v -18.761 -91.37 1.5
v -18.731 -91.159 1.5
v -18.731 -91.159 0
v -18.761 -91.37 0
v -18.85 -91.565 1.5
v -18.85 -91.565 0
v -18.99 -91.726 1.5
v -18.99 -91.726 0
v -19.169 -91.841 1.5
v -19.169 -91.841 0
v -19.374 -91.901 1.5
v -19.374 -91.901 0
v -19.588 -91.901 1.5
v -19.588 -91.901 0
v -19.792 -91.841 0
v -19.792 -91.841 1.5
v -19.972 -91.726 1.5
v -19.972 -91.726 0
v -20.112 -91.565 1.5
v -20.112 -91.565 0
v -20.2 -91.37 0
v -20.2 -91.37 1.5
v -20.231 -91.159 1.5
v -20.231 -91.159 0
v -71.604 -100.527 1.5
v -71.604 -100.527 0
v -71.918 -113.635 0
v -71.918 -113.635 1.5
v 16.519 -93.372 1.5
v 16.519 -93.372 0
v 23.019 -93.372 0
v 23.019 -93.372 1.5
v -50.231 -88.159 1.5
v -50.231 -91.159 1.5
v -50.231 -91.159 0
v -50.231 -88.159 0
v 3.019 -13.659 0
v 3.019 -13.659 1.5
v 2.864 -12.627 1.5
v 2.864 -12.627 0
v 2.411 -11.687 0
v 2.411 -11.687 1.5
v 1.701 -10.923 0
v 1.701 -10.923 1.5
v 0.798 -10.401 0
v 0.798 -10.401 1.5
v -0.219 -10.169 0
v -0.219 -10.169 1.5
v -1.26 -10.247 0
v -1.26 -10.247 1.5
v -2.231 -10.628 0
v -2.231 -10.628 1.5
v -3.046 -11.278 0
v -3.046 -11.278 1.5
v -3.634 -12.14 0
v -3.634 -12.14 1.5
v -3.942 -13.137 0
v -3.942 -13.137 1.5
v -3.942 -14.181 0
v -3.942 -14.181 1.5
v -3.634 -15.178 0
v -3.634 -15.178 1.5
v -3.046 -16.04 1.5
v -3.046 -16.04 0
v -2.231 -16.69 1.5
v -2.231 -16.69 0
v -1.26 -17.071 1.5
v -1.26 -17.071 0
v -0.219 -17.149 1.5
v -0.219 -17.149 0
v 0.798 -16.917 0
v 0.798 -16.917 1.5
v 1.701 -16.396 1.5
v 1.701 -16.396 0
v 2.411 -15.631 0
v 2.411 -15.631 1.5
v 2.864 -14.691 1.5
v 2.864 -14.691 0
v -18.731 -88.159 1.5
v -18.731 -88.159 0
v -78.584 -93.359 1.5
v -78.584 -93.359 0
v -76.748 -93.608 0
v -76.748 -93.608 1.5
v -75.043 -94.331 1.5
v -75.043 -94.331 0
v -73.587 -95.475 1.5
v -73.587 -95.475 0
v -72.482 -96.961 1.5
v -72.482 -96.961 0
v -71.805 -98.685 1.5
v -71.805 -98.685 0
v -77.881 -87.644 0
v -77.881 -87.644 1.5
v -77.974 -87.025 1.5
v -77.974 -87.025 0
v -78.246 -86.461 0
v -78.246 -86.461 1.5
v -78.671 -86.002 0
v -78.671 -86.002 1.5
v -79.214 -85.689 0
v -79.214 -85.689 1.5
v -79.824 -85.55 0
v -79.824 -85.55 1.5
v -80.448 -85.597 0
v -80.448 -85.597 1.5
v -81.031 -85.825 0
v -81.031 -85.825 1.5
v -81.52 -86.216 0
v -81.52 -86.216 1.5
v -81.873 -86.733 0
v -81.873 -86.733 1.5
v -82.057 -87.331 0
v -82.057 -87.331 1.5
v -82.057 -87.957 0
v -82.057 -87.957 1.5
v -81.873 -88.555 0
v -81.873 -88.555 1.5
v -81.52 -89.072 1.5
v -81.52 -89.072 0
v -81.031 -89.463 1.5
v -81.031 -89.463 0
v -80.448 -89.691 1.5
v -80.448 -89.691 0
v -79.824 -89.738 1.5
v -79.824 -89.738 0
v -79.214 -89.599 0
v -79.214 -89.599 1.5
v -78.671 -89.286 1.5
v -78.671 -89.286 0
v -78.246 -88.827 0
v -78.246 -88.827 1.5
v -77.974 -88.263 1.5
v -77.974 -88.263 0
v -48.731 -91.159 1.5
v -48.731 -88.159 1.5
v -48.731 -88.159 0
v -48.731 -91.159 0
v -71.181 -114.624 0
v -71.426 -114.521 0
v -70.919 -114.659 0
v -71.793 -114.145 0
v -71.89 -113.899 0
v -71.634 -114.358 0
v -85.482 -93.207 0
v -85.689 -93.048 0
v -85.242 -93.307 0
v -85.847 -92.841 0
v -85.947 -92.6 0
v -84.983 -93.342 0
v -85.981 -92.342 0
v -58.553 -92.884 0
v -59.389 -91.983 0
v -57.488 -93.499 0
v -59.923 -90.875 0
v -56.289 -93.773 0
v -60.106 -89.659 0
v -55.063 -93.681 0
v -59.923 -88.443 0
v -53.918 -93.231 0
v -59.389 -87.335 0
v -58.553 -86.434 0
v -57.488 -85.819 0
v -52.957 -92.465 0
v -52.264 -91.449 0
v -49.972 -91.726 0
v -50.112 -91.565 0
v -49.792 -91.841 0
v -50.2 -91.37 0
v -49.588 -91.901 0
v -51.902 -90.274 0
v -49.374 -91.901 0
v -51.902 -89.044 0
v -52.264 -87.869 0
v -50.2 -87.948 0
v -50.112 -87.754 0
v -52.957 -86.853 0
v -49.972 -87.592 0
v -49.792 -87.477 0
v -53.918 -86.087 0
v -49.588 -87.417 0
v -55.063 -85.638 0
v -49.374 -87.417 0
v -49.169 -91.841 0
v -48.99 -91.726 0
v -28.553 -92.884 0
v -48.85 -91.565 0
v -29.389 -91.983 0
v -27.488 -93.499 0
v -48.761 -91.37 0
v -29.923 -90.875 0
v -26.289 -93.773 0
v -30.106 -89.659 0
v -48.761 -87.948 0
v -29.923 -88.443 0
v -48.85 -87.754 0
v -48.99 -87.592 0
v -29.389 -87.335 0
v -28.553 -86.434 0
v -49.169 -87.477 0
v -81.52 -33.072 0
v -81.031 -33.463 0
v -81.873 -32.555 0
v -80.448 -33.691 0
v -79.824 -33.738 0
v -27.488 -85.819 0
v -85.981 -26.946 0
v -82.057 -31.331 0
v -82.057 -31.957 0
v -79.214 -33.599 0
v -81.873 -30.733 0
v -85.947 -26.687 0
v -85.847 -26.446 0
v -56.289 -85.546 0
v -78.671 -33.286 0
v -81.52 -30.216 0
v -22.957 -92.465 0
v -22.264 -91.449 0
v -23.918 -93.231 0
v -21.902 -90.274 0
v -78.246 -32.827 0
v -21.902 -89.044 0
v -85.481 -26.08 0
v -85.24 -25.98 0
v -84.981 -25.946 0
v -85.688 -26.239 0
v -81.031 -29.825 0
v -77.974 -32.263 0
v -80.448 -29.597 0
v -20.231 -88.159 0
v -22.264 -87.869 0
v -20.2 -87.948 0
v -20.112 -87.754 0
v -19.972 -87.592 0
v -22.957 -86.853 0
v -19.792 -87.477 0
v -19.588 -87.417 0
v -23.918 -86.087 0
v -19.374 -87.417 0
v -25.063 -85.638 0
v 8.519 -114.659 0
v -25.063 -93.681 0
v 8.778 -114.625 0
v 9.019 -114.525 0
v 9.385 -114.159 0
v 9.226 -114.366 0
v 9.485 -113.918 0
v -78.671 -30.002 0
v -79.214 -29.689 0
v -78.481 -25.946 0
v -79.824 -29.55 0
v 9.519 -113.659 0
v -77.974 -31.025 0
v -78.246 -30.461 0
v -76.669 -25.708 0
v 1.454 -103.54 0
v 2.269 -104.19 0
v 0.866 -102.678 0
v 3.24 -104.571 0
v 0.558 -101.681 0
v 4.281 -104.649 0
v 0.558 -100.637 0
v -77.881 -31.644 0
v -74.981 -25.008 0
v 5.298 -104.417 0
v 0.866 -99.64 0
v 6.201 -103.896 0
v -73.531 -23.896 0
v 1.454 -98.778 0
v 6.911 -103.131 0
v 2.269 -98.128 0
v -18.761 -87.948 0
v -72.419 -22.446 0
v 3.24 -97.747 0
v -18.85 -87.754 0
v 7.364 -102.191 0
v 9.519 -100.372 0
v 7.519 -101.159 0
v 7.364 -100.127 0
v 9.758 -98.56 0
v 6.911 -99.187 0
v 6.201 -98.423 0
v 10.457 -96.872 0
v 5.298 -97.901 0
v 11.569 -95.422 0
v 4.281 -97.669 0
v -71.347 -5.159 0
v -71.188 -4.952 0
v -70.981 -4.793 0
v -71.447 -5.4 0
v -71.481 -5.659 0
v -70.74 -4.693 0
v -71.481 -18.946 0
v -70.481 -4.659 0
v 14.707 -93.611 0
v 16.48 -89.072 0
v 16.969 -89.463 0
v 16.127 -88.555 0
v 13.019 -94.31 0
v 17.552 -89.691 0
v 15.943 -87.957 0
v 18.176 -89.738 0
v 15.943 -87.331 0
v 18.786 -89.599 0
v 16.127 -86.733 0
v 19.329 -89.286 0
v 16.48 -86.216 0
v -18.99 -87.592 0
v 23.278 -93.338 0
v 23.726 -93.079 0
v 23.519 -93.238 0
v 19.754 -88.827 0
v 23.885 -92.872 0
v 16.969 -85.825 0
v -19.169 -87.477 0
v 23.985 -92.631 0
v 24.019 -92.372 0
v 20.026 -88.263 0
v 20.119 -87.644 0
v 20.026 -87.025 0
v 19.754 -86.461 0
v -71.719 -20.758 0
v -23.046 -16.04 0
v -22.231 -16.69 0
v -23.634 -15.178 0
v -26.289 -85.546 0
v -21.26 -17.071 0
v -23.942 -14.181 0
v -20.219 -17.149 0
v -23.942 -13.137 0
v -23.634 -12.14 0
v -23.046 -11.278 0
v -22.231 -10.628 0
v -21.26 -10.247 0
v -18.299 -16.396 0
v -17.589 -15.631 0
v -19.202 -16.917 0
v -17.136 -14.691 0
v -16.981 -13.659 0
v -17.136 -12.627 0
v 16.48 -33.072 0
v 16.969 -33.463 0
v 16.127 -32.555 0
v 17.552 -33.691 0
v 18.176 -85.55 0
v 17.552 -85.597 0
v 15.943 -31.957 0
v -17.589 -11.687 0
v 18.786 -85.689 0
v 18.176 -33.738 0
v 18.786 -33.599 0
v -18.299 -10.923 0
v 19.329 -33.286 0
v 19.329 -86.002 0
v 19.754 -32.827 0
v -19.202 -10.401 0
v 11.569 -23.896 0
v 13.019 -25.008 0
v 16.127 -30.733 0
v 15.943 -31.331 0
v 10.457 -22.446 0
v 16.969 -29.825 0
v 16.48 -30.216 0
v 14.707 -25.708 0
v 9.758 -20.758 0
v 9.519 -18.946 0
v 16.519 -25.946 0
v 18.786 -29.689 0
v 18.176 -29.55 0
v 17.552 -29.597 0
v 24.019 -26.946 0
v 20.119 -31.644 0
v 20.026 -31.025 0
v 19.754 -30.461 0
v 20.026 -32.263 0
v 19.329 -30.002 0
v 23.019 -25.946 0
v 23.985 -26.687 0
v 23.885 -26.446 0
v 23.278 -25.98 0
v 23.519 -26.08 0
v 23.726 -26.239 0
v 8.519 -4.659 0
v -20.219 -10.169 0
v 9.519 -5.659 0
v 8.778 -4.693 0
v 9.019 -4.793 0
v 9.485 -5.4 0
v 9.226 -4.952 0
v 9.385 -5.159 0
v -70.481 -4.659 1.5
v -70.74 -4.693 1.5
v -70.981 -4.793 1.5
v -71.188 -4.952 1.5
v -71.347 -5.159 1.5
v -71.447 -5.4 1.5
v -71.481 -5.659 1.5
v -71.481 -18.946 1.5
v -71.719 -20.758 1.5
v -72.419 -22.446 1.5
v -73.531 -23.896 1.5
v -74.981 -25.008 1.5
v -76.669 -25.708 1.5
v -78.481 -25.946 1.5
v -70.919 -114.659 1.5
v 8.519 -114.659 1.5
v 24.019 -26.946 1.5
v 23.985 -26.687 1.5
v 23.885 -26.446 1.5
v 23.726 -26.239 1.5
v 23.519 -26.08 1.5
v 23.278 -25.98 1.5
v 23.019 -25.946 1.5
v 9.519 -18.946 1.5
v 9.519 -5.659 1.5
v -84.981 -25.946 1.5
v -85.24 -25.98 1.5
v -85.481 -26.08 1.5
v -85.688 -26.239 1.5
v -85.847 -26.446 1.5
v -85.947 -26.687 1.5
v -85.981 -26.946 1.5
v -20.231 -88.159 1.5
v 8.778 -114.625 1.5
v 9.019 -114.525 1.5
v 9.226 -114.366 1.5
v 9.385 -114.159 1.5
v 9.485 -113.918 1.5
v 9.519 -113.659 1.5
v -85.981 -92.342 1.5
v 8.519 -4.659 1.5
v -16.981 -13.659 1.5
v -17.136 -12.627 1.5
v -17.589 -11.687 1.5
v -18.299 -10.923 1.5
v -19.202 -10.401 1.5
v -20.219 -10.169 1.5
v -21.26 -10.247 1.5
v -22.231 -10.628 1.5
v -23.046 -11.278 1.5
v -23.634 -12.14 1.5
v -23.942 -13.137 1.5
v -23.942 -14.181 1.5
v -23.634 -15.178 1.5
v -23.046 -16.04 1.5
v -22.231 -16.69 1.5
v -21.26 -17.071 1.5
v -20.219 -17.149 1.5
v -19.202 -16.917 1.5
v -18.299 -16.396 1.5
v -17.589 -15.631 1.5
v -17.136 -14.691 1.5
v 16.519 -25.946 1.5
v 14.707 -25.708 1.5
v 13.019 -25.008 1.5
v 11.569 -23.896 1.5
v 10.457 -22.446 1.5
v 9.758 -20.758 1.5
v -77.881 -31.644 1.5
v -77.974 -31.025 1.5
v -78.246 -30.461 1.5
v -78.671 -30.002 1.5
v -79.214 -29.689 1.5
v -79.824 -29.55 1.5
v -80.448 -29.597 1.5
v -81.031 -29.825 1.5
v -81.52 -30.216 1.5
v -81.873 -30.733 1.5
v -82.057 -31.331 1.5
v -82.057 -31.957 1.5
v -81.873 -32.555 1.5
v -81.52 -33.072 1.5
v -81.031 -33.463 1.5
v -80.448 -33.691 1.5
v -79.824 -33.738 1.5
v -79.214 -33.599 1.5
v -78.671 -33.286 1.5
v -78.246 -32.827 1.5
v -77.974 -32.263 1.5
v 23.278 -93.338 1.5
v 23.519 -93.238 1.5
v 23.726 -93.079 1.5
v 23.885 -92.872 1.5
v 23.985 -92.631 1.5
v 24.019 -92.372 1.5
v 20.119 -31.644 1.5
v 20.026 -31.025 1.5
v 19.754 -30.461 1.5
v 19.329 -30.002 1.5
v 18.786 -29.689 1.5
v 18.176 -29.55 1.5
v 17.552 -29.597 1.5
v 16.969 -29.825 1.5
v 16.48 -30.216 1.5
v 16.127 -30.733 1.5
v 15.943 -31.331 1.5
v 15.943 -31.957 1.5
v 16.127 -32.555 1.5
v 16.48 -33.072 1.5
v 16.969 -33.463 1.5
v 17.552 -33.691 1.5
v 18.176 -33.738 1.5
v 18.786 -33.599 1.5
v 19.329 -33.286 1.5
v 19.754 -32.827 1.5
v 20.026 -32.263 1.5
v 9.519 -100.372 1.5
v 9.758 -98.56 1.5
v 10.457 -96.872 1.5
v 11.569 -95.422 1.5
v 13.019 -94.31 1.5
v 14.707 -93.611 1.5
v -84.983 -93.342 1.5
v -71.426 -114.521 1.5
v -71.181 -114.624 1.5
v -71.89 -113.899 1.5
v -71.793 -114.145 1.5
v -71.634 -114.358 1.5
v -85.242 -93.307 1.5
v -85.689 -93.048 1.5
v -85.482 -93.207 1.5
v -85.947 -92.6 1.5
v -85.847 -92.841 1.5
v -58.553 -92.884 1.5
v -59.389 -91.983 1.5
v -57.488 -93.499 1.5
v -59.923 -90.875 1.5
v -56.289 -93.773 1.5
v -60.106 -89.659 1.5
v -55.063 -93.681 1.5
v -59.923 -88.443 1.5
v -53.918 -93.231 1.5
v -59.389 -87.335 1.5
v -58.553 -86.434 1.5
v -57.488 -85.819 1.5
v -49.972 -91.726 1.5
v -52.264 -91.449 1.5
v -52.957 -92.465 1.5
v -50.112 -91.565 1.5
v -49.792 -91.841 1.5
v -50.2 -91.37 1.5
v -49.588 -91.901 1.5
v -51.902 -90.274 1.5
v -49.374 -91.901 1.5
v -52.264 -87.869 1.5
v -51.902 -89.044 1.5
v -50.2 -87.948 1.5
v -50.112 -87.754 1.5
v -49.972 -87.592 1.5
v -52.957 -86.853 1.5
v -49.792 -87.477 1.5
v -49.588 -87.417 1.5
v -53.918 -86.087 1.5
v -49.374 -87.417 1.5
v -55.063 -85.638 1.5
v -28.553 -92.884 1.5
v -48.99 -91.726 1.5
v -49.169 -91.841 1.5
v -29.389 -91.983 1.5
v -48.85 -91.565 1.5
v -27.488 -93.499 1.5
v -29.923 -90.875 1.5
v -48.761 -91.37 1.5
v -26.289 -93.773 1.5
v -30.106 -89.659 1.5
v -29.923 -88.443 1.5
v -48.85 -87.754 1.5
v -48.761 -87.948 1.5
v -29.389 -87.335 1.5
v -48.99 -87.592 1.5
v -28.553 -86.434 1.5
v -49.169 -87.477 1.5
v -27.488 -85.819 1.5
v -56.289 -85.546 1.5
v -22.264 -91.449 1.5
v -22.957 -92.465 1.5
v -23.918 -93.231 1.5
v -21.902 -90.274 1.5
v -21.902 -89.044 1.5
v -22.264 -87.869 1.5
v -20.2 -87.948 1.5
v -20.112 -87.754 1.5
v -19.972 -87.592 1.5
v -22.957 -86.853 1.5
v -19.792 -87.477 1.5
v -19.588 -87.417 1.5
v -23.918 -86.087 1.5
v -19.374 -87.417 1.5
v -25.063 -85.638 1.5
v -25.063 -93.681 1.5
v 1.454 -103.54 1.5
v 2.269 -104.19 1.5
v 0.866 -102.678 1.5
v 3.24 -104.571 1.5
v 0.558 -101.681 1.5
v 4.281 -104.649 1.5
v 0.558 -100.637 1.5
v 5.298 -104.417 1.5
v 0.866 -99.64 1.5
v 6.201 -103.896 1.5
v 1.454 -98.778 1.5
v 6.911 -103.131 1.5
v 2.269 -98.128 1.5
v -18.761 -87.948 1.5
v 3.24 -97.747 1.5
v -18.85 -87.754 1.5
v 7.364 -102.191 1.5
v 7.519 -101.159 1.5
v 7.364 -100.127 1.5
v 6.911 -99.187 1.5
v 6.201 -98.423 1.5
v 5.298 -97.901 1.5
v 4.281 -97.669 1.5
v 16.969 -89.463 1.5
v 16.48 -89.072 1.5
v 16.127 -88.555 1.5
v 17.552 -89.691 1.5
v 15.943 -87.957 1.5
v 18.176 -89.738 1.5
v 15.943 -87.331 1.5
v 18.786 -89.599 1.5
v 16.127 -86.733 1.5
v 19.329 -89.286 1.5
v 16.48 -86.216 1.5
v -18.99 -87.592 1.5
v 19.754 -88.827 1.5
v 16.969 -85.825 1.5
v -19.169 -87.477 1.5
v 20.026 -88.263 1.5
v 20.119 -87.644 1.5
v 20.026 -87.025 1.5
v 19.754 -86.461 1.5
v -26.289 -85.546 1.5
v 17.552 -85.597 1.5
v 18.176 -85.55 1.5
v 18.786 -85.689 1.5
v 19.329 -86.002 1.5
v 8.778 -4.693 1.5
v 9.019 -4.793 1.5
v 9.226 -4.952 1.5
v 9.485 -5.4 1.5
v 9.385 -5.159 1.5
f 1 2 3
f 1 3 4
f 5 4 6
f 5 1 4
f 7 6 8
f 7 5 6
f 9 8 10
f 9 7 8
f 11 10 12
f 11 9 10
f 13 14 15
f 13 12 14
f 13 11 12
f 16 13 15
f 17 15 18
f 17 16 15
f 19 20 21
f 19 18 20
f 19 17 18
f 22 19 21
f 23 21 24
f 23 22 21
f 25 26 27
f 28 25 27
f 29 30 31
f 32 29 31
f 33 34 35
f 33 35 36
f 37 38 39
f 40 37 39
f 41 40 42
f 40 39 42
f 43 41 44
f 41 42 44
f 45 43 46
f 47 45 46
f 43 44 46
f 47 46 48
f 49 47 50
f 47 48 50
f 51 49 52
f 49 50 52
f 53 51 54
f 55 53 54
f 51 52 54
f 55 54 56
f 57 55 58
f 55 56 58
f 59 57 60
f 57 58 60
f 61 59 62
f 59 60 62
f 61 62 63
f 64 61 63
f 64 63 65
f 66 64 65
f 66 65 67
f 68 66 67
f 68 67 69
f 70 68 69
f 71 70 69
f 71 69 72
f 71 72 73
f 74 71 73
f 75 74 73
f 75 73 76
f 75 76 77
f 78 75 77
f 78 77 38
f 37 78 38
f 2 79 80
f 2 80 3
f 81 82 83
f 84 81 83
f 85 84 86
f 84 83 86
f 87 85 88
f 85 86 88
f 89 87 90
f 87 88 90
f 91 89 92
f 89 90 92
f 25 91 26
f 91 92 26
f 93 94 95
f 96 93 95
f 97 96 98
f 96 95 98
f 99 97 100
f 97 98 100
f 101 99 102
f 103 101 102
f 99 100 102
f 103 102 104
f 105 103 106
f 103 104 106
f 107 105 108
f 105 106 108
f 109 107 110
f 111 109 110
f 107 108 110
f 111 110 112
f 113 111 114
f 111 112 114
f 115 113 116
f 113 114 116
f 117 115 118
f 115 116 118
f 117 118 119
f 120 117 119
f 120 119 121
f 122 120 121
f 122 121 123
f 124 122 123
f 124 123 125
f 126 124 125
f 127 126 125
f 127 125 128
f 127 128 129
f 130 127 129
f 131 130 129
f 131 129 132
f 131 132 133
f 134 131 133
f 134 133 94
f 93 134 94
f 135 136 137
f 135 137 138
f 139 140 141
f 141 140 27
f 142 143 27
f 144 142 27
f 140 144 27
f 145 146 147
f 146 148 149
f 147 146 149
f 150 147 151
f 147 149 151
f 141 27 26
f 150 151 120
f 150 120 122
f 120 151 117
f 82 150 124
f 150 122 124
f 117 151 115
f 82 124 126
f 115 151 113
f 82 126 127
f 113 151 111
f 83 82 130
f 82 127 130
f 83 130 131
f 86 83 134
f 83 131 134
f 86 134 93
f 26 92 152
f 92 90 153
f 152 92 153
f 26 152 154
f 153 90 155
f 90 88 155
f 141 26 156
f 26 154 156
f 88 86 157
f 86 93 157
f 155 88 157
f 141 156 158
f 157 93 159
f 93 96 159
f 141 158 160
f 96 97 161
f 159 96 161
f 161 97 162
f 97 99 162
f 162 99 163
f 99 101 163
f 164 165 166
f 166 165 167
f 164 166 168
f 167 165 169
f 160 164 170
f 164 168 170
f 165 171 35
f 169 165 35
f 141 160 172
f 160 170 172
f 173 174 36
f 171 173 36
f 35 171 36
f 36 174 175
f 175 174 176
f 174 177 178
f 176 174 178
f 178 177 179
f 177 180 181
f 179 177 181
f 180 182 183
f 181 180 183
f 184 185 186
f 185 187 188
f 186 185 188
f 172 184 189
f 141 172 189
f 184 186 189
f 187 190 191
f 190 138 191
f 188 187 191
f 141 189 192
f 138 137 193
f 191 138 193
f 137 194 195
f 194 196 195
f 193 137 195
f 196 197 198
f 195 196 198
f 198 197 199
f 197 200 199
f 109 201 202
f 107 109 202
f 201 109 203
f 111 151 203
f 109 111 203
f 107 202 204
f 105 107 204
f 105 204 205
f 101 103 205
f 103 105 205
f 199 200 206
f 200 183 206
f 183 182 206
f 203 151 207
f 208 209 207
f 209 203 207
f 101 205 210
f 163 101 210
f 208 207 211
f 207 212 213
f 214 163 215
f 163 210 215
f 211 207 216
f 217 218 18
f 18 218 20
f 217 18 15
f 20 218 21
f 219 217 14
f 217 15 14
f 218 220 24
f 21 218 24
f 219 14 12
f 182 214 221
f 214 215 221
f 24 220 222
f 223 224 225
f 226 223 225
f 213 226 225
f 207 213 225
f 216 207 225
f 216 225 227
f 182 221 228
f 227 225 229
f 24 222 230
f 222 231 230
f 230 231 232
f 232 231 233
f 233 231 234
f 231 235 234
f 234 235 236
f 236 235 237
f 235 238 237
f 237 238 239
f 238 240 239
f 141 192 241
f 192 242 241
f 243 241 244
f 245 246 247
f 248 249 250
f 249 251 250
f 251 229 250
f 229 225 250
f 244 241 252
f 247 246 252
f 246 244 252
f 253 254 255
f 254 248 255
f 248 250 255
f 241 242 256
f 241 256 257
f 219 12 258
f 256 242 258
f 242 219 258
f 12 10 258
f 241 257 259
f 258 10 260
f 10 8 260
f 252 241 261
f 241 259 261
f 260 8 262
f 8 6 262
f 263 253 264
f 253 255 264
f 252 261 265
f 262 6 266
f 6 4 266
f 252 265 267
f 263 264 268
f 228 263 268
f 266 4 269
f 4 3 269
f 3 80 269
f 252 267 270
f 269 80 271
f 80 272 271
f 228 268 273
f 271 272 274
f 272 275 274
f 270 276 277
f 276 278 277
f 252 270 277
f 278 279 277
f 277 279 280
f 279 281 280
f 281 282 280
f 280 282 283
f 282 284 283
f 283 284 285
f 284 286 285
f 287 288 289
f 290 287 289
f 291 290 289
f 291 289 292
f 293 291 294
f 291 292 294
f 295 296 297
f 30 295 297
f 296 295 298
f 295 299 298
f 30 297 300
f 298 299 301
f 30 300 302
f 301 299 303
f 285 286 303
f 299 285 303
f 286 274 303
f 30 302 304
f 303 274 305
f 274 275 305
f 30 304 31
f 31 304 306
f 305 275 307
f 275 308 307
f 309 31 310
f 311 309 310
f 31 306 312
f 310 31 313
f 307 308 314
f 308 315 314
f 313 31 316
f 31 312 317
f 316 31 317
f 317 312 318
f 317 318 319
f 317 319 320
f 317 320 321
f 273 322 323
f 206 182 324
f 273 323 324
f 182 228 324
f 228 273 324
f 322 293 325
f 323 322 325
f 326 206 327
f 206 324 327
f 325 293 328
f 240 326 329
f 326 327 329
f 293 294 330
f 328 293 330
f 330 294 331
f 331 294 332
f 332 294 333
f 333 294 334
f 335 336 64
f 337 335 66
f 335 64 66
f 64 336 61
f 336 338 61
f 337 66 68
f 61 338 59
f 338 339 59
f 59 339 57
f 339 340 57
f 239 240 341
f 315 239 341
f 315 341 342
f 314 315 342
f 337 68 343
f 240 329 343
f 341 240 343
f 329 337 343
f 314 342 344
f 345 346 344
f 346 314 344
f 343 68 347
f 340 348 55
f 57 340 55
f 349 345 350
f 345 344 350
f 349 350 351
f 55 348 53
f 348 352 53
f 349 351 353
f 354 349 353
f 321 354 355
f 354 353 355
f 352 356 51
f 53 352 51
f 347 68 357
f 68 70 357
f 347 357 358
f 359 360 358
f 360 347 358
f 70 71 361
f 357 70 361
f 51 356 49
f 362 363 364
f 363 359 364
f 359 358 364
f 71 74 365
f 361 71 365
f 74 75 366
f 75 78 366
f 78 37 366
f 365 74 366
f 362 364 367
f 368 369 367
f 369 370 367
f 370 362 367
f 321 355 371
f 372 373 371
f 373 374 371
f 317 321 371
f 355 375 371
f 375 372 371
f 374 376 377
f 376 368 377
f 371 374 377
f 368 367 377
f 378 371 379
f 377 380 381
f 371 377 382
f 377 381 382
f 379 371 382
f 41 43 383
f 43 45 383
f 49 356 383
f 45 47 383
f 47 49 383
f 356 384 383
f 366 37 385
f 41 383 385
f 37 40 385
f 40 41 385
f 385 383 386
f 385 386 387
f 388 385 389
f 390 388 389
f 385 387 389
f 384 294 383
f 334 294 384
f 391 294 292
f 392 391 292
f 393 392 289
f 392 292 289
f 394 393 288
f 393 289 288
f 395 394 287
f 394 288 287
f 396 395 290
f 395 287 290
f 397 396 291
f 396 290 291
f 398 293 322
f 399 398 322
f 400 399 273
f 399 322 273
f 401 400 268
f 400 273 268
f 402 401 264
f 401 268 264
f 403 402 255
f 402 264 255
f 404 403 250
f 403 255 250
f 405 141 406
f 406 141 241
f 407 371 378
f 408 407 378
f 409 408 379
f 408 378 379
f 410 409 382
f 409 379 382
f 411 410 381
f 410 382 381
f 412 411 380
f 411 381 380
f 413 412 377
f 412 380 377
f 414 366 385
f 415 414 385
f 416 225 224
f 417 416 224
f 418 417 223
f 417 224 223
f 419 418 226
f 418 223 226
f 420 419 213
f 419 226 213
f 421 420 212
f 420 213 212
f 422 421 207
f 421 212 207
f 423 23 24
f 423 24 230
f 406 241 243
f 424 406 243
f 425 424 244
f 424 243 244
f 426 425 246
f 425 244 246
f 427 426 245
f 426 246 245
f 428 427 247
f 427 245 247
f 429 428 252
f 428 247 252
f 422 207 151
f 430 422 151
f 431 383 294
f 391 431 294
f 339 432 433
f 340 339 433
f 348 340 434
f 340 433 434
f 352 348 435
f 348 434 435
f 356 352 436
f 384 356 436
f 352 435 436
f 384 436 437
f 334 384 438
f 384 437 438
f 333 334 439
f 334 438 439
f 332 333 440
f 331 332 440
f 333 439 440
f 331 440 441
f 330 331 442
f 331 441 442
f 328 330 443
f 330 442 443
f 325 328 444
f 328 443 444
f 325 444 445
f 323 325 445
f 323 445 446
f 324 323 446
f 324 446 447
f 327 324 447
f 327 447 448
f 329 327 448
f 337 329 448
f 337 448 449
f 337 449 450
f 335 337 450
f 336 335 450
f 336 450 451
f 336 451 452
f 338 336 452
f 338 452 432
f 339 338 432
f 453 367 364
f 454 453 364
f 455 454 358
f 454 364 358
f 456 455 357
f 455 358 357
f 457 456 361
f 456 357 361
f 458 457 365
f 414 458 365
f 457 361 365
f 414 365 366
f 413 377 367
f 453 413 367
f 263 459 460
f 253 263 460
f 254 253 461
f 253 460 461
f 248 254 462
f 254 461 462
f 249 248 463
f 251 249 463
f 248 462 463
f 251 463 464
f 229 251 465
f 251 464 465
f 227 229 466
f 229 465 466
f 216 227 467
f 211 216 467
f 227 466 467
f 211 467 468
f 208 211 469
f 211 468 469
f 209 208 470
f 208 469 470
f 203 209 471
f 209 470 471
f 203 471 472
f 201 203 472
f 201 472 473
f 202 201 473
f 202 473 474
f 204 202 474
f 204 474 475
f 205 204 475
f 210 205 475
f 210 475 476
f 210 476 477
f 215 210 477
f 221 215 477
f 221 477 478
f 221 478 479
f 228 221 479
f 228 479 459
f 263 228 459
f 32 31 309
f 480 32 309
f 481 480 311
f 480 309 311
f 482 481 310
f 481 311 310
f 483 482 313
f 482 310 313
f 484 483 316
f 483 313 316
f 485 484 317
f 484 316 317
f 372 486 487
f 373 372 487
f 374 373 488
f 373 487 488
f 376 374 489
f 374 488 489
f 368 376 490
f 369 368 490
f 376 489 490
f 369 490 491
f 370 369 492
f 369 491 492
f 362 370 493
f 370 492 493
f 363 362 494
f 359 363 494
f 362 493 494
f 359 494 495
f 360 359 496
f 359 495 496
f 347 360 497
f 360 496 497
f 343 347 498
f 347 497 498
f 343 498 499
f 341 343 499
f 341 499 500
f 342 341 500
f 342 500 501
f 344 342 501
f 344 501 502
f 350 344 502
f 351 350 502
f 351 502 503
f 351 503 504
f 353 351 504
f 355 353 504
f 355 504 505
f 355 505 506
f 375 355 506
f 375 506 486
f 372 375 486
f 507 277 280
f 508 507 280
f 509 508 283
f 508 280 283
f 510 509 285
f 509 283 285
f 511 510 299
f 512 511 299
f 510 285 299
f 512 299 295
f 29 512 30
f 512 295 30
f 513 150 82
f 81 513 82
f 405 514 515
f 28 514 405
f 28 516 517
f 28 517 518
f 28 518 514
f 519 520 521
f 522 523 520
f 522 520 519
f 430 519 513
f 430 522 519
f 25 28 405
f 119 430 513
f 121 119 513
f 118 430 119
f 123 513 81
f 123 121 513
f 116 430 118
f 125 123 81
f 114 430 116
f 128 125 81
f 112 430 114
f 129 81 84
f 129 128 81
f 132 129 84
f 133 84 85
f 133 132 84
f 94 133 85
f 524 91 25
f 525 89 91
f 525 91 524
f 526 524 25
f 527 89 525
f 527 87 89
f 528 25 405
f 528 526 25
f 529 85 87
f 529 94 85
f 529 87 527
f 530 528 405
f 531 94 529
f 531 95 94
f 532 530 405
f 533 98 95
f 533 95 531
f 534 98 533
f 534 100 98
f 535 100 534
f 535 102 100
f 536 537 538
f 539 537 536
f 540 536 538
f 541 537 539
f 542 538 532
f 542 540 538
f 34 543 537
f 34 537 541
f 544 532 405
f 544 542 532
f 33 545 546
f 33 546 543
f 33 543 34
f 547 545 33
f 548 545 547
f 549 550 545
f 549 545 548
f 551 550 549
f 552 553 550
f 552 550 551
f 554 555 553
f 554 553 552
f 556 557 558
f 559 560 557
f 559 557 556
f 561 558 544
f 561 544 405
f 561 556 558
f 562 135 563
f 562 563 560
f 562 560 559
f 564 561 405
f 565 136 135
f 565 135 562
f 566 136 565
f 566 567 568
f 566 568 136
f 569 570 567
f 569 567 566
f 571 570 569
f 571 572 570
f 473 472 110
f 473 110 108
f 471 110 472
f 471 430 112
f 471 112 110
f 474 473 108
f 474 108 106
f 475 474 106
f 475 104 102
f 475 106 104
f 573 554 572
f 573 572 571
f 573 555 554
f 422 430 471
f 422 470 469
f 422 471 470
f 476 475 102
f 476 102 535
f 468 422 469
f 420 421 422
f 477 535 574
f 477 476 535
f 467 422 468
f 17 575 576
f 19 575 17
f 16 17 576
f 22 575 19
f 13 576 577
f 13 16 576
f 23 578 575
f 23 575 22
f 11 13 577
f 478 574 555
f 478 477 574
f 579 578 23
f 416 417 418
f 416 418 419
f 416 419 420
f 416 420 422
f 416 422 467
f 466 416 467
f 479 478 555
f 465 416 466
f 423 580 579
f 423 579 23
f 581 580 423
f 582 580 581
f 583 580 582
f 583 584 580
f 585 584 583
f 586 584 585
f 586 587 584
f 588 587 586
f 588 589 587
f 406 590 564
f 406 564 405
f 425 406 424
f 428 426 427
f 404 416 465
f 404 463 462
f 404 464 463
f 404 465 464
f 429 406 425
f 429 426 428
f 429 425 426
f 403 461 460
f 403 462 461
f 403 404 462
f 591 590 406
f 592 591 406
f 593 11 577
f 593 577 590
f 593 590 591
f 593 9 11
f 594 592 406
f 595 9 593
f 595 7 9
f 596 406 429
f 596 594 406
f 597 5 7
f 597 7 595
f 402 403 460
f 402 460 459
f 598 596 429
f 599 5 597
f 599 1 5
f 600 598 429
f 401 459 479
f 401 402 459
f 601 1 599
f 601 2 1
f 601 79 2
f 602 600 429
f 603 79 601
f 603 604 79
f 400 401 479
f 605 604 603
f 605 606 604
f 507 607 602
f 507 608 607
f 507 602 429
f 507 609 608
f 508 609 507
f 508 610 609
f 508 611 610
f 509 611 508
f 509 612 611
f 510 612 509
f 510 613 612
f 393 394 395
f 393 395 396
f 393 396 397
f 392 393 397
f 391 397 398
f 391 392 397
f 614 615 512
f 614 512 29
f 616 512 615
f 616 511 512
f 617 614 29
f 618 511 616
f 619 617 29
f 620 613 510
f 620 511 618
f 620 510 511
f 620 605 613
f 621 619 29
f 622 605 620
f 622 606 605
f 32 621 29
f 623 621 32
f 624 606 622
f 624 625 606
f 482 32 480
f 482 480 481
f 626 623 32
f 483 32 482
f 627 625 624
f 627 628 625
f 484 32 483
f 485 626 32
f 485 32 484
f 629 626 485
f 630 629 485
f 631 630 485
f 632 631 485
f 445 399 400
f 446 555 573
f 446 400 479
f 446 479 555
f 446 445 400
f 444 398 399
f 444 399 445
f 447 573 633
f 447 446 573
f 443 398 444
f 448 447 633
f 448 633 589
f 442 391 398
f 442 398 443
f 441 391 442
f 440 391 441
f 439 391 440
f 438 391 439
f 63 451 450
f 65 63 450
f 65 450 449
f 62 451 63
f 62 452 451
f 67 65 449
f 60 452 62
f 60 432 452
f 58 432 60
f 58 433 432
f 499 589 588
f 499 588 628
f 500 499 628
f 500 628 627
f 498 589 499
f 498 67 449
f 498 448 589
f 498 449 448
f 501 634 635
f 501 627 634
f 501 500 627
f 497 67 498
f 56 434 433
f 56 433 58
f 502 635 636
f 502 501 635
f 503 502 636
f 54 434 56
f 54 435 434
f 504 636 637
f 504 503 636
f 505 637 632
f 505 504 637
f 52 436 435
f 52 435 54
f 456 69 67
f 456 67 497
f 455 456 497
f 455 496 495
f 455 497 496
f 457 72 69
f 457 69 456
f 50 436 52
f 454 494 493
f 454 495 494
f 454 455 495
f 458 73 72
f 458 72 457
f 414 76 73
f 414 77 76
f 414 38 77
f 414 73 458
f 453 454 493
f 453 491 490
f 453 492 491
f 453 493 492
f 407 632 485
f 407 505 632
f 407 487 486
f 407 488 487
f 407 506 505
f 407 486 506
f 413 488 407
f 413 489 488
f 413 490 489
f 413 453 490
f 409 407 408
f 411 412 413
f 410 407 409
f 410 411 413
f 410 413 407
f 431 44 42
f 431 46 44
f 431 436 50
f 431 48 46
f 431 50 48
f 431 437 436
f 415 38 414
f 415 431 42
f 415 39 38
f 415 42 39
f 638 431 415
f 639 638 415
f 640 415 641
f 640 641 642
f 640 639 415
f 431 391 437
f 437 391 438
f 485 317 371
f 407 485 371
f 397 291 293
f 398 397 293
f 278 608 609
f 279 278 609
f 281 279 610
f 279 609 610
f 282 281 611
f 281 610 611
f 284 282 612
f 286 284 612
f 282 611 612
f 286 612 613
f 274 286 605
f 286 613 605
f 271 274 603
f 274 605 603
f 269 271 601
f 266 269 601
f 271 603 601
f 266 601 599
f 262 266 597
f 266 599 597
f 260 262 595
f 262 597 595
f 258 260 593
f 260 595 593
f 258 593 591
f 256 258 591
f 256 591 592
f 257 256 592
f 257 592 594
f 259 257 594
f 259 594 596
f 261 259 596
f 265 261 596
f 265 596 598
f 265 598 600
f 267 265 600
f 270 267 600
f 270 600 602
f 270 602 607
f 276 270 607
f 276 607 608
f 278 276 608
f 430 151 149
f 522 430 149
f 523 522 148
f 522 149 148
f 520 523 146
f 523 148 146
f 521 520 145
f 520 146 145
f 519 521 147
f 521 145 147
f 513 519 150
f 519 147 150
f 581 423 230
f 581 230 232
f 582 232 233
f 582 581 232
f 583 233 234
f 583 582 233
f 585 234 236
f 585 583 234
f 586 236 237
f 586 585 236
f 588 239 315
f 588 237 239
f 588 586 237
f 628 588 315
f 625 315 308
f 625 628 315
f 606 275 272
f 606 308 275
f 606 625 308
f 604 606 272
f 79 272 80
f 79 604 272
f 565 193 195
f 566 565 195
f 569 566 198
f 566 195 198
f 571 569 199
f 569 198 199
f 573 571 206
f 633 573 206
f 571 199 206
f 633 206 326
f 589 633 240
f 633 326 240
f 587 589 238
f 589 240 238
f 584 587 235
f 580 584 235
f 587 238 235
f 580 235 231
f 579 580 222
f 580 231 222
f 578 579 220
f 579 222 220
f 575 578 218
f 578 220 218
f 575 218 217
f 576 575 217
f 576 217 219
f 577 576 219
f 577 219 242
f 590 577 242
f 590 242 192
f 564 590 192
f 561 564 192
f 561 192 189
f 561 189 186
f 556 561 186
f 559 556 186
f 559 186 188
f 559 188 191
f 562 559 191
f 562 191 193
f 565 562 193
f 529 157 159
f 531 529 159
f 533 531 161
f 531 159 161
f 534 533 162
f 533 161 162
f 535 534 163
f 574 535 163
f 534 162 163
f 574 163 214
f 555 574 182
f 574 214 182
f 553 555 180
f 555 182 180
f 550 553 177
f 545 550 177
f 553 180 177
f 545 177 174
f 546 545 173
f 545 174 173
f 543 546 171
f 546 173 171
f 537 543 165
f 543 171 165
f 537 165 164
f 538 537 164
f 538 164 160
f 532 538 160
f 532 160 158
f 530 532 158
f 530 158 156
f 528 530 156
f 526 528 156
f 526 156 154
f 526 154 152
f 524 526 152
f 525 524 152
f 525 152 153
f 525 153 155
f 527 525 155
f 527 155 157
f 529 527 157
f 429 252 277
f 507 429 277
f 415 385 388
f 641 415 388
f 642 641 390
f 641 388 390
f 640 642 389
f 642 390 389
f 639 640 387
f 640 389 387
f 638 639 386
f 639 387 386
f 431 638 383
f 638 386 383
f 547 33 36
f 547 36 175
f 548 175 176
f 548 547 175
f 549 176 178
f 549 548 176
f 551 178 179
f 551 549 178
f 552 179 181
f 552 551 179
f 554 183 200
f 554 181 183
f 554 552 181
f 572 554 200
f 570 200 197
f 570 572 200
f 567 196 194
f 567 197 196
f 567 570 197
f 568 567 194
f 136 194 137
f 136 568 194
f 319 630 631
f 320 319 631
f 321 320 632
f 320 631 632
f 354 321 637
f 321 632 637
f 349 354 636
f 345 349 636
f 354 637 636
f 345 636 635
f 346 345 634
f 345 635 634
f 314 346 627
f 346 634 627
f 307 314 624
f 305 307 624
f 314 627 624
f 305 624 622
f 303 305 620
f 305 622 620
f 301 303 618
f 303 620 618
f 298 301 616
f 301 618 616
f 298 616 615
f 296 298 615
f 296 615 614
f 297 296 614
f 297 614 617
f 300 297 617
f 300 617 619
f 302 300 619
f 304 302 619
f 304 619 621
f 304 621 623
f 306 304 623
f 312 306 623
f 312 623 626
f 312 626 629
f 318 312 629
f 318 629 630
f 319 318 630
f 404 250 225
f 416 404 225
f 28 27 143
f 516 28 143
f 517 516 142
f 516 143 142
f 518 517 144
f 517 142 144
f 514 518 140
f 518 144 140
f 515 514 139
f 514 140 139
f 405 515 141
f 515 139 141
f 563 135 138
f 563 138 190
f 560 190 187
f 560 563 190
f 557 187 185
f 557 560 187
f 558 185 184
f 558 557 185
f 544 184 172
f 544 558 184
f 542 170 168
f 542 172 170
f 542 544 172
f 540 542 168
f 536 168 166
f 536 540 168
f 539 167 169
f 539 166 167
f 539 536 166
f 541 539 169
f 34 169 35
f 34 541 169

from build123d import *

# Parameters (mm, degrees)
EXTRUDE_1_DEPTH     = 1.5
HOLE_WIZARD_M4_1_D  = 4.2
HOLE_WIZARD_M8_1_D  = 8.25
SKETCH_8_R          = 3.5
CUT_EXTRUDE_1_DEPTH = 144.323608762
SKETCH_9_R          = 3.5
CUT_EXTRUDE_2_DEPTH = 144.323608762
CUT_EXTRUDE_3_DEPTH = 144.323608762


with BuildPart() as part:
    # 草圖1 → 填料-伸長1 (new body)
    with BuildSketch(Plane.XY):
        with BuildLine():
            Line((9.519190028, -18.946187519), (9.519190028, -5.659090909))
            ThreePointArc((9.519190028, -5.659090909), (9.226296809, -4.951984128), (8.519190028, -4.659090909))
            Line((8.519190028, -4.659090909), (-70.48081017, -4.659090909))
            ThreePointArc((-70.48081017, -4.659090909), (-71.187916951, -4.951984128), (-71.48081017, -5.659090909))
            Line((-71.48081017, -5.659090909), (-71.48081017, -18.946187519))
            ThreePointArc((-71.48081017, -18.946187519), (-73.531062702, -23.895934988), (-78.48081017, -25.946187519))
            Line((-78.48081017, -25.946187519), (-84.980810071, -25.946187519))
            ThreePointArc((-84.980810071, -25.946187519), (-85.687916853, -26.239080738), (-85.980810071, -26.946187519))
            Line((-85.980810071, -26.946187519), (-85.980810071, -92.341911374))
            ThreePointArc((-85.980810071, -92.341911374), (-85.688840793, -93.048093006), (-84.983425077, -93.341907955))
            Line((-84.983425077, -93.341907955), (-78.583599692, -93.358643592))
            ThreePointArc((-78.583599692, -93.358643592), (-73.586751521, -95.475153852), (-71.603919064, -100.526538095))
            Line((-71.603919064, -100.526538095), (-71.918462387, -113.635102561))
            ThreePointArc((-71.918462387, -113.635102561), (-71.634287831, -114.357665047), (-70.918750149, -114.659090909))
            Line((-70.918750149, -114.659090909), (8.519190028, -114.659090909))
            ThreePointArc((8.519190028, -114.659090909), (9.226296809, -114.36619769), (9.519190028, -113.659090909))
            Line((9.519190028, -113.659090909), (9.519190028, -100.371994299))
            ThreePointArc((9.519190028, -100.371994299), (11.569442559, -95.422246831), (16.519190028, -93.371994299))
            Line((16.519190028, -93.371994299), (23.019189929, -93.371994299))
            ThreePointArc((23.019189929, -93.371994299), (23.72629671, -93.07910108), (24.019189929, -92.371994299))
            Line((24.019189929, -92.371994299), (24.019189929, -26.946187519))
            ThreePointArc((24.019189929, -26.946187519), (23.72629671, -26.239080738), (23.019189929, -25.946187519))
            Line((23.019189929, -25.946187519), (16.519190028, -25.946187519))
            ThreePointArc((16.519190028, -25.946187519), (11.569442559, -23.895934988), (9.519190028, -18.946187519))
        make_face()
    extrude(amount=EXTRUDE_1_DEPTH)

    # M4 螺旋的螺孔鑽1 (through all)
    with Locations(Plane(origin=(0, 0, 0), x_dir=(-1, 0, 0), z_dir=(0, 0, -1))):
        with Locations((79.980810071, -87.644049447), (-18.019189929, -87.644049447), (-18.019189929, -31.644049447), (79.980810071, -31.644049447)):
            Hole(HOLE_WIZARD_M4_1_D / 2)

    # M8 螺旋的螺孔鑽1 (through all)
    with Locations(Plane.XY.offset(1.5)):
        with Locations((-55.980810071, -89.659090909), (-25.980810071, -89.659090909)):
            Hole(HOLE_WIZARD_M8_1_D / 2)

    # 草圖8 → 除料-伸長1 (cut, through all)
    with BuildSketch(Plane.XY.offset(1.5)):
        with Locations((4.019190028, -101.159090909)):
            Circle(SKETCH_8_R)
    extrude(amount=-CUT_EXTRUDE_1_DEPTH, mode=Mode.SUBTRACT)

    # 草圖9 → 除料-伸長2 (cut, through all)
    with BuildSketch(Plane.XY.offset(1.5)):
        with Locations((-0.480809972, -13.659090909)):
            Circle(SKETCH_9_R)
        with Locations((-20.480809972, -13.659090909)):
            Circle(SKETCH_9_R)
    extrude(amount=-CUT_EXTRUDE_2_DEPTH, mode=Mode.SUBTRACT)

    # 草圖10 → 除料-伸長3 (cut, through all)
    with BuildSketch(Plane.XY.offset(1.5)):
        with BuildLine():
            Line((-50.230810071, -91.159090909), (-50.230810071, -88.159090909))
            ThreePointArc((-50.230810071, -88.159090909), (-49.480810071, -87.409090909), (-48.730810071, -88.159090909))
            Line((-48.730810071, -88.159090909), (-48.730810071, -91.159090909))
            ThreePointArc((-48.730810071, -91.159090909), (-49.480810071, -91.909090909), (-50.230810071, -91.159090909))
        make_face()
        with BuildLine():
            Line((-20.230810071, -91.159090909), (-20.230810071, -88.159090909))
            ThreePointArc((-20.230810071, -88.159090909), (-19.480810071, -87.409090909), (-18.730810071, -88.159090909))
            Line((-18.730810071, -88.159090909), (-18.730810071, -91.159090909))
            ThreePointArc((-18.730810071, -91.159090909), (-19.480810071, -91.909090909), (-20.230810071, -91.159090909))
        make_face()
    extrude(amount=-CUT_EXTRUDE_3_DEPTH, mode=Mode.SUBTRACT)


solid = part.part
